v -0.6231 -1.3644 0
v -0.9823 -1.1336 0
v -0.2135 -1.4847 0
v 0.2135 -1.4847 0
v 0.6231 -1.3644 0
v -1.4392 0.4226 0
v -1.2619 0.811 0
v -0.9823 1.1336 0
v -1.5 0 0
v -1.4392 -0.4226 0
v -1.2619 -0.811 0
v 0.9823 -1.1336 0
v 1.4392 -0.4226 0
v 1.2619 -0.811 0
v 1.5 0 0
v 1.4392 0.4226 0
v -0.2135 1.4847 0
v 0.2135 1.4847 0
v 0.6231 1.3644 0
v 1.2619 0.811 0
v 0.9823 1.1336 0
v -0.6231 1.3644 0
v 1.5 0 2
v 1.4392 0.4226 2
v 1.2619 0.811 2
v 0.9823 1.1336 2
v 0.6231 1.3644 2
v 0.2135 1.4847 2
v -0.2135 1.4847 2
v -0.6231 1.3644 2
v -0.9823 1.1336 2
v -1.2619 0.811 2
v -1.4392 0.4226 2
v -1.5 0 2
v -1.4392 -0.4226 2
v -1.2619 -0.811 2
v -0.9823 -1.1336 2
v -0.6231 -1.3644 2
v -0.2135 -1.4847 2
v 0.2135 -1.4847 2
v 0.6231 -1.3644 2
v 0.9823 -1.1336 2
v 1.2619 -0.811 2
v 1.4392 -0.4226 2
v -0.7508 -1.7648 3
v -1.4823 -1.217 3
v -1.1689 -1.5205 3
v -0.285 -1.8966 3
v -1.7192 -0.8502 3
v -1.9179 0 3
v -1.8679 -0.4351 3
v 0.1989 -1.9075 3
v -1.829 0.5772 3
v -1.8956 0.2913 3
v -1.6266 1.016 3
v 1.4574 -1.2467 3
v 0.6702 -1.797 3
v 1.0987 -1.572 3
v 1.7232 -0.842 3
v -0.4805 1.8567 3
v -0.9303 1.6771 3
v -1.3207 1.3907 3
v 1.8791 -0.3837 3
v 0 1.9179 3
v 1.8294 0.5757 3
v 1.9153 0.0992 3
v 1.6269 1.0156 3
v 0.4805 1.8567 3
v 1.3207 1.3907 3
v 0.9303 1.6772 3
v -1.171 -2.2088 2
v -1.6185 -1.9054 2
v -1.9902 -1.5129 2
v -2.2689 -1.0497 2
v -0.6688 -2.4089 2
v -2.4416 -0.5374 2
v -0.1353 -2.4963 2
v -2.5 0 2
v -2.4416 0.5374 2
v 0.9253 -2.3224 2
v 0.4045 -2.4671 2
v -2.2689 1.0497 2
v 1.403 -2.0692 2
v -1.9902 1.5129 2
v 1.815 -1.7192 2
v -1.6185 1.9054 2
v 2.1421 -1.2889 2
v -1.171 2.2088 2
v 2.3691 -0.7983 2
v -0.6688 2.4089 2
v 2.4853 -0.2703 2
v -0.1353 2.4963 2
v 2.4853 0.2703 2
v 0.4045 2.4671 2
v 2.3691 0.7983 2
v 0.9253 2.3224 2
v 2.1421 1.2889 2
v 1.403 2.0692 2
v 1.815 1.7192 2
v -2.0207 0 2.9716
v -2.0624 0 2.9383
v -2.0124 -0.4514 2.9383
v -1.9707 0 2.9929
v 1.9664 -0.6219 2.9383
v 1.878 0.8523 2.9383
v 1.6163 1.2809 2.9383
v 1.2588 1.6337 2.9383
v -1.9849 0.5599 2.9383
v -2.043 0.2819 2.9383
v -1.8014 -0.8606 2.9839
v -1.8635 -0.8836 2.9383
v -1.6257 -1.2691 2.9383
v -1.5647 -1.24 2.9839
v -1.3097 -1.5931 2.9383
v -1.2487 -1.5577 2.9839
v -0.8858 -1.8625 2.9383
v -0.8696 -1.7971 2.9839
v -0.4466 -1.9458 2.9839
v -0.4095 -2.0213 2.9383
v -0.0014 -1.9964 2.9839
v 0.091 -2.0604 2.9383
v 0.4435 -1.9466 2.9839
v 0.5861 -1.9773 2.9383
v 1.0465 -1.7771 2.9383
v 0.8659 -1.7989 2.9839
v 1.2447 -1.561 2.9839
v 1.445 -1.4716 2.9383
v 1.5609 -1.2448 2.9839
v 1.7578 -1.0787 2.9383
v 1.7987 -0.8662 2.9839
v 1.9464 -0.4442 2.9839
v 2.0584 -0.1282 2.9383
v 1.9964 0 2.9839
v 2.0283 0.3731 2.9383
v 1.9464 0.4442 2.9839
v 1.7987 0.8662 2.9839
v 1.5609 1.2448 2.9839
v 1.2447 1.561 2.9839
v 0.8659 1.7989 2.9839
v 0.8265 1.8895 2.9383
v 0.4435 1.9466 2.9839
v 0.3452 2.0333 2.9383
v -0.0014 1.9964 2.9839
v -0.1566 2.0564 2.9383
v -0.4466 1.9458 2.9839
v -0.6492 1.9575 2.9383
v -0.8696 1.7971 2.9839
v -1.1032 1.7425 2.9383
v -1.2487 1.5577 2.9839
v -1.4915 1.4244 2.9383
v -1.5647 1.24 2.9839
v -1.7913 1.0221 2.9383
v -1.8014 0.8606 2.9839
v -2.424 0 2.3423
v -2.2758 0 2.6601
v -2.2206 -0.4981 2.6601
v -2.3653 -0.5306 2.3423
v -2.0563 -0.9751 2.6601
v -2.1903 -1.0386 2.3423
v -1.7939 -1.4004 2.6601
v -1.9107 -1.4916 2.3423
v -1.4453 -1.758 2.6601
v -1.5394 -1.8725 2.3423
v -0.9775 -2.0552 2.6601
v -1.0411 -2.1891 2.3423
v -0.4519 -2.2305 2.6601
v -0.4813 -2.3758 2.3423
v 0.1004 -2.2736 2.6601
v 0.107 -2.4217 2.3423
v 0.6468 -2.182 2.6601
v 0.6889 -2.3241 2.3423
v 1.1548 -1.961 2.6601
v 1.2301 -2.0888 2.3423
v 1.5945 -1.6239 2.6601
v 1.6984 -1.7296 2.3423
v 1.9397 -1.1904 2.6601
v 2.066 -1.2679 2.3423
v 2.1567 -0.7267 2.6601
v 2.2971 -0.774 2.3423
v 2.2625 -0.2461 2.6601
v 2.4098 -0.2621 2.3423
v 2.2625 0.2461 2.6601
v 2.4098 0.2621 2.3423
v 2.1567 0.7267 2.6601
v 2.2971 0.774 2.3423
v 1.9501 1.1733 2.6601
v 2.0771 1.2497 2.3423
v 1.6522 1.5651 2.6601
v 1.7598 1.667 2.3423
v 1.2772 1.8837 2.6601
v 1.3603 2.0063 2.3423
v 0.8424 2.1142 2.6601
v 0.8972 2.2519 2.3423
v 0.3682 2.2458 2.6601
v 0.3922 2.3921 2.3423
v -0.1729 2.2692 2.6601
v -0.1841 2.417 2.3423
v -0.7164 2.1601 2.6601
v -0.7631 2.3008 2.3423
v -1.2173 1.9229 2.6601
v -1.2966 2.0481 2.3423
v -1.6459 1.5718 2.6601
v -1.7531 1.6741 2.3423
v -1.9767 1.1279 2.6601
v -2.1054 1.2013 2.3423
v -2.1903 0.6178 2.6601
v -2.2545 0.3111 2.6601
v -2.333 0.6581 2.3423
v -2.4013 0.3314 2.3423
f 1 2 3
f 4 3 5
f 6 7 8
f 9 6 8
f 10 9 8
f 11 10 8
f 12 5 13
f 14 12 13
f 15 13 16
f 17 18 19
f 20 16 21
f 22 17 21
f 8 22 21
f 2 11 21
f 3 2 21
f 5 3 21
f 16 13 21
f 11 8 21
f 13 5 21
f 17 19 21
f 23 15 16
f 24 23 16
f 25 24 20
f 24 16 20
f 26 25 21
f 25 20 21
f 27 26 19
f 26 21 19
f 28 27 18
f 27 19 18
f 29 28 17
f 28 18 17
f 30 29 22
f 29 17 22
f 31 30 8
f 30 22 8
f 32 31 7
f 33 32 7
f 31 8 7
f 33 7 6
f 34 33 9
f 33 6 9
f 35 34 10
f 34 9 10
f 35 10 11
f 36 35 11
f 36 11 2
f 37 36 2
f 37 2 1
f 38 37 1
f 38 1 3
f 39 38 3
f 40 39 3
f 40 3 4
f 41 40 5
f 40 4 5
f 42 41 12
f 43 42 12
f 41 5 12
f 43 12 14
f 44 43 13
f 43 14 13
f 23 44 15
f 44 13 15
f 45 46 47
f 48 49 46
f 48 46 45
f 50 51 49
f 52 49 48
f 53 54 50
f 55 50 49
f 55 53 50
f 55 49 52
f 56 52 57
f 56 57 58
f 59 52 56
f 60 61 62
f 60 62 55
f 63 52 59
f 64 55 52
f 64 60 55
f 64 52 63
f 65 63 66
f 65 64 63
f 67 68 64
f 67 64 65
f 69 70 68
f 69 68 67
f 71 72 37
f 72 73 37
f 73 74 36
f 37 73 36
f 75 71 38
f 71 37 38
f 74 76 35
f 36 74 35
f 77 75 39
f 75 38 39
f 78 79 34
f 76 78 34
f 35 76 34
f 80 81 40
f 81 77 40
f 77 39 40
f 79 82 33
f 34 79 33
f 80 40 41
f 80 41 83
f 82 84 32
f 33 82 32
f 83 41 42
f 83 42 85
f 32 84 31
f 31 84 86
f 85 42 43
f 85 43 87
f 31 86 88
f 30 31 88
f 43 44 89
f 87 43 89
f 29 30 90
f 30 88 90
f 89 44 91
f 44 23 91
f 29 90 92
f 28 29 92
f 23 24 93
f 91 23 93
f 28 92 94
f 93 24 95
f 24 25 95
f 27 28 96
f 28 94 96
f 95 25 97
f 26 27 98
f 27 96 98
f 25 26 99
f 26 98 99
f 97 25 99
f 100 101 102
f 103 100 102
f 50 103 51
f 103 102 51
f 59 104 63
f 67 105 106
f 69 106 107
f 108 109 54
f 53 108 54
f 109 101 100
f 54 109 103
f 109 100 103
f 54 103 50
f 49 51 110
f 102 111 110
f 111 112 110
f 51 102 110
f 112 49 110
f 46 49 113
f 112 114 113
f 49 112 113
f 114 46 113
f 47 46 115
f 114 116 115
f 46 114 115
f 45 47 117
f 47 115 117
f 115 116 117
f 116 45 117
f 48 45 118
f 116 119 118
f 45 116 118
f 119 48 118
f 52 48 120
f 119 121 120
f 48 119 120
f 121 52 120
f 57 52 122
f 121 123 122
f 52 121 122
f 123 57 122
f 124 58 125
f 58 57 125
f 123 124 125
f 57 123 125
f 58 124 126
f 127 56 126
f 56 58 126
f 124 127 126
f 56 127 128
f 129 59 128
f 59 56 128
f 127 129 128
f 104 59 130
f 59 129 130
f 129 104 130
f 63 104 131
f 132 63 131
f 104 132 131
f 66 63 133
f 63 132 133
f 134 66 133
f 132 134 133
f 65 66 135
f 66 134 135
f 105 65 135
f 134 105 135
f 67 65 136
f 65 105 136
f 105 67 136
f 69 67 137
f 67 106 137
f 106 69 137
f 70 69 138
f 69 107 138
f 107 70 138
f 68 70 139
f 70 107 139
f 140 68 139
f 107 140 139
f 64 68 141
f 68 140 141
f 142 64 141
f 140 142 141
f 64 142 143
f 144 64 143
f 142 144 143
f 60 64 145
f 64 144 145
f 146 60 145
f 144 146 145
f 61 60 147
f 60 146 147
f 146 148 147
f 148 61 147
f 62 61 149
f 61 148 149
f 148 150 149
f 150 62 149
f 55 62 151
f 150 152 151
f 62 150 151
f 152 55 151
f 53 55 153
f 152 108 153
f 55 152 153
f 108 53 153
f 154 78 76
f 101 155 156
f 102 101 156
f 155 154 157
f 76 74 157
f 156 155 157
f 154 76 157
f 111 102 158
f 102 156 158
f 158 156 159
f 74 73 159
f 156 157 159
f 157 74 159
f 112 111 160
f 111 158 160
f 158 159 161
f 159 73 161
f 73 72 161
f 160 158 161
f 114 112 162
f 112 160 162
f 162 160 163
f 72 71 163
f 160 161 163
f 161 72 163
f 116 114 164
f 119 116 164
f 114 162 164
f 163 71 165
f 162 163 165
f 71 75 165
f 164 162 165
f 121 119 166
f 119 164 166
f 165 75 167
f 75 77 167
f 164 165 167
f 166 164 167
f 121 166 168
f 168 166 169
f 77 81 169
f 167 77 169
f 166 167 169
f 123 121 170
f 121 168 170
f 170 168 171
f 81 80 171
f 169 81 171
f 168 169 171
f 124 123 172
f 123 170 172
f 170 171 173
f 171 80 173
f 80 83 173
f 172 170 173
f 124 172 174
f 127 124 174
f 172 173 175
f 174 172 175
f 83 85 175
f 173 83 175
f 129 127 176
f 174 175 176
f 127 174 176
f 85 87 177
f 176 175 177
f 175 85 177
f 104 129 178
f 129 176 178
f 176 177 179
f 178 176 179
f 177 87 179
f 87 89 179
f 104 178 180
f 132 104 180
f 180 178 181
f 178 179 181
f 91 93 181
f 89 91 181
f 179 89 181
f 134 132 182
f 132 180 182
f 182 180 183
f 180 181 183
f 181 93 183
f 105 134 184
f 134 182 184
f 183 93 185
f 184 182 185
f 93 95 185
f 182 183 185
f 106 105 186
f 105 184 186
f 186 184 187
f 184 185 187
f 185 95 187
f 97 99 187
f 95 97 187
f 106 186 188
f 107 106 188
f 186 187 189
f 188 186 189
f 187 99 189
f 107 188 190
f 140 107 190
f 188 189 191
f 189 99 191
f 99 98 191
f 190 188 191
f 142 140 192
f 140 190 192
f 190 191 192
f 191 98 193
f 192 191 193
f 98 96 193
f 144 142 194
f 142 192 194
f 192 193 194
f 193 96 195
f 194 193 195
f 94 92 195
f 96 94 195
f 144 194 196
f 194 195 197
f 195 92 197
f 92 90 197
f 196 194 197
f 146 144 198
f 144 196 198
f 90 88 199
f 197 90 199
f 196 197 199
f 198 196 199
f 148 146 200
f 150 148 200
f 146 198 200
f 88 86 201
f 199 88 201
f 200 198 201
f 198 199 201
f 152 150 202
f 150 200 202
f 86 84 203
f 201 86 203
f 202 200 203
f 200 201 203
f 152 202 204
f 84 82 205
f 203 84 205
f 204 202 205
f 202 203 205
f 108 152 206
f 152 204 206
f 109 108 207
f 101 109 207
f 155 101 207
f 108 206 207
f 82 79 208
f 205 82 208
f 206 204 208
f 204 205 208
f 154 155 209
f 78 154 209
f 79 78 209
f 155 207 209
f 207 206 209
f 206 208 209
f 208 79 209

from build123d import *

# Parameters (mm, degrees)
CROQUIS1_R              = 1.5
SALIENTE_EXTRUIR1_DEPTH = 2
CROQUIS2_R              = 2.5
SALIENTE_EXTRUIR2_DEPTH = 1
REDONDEO3_R             = 0.2


with BuildPart() as part:
    # Croquis1 → Saliente-Extruir1 (new body)
    with BuildSketch(Plane.XY):
        Circle(CROQUIS1_R)
    extrude(amount=SALIENTE_EXTRUIR1_DEPTH)

    # Croquis2 → Saliente-Extruir2 (add)
    with BuildSketch(Plane.XY.offset(2)):
        Circle(CROQUIS2_R)
    extrude(amount=SALIENTE_EXTRUIR2_DEPTH)

    # Croquis3 → Cortar-Revolución1 (revolve, cut)
    with BuildSketch(Plane(origin=(0, 0, 0), x_dir=(0, 0, -1), z_dir=(1, 0, 0)), mode=Mode.PRIVATE) as cortar_revoluci_n1_sk:
        with BuildLine():
            Line((-2, 2.5), (-3, 2.5))
            Line((-3, 2.5), (-3, 2))
            ThreePointArc((-3, 2), (-2.54475609, 2.33951218), (-2, 2.5))
        make_face()
    revolve(cortar_revoluci_n1_sk.sketch.rotate(Axis((0, 0, 0), (0, 0, 1)), 90), axis=Axis((0, 0, 0), (0, 0, 1)), mode=Mode.SUBTRACT)

    # Redondeo3
    redondeo3_edges = [part.edges().sort_by_distance(p)[0] for p in [
        (2, 0, 3),
    ]]
    fillet(redondeo3_edges, radius=REDONDEO3_R)


solid = part.part
